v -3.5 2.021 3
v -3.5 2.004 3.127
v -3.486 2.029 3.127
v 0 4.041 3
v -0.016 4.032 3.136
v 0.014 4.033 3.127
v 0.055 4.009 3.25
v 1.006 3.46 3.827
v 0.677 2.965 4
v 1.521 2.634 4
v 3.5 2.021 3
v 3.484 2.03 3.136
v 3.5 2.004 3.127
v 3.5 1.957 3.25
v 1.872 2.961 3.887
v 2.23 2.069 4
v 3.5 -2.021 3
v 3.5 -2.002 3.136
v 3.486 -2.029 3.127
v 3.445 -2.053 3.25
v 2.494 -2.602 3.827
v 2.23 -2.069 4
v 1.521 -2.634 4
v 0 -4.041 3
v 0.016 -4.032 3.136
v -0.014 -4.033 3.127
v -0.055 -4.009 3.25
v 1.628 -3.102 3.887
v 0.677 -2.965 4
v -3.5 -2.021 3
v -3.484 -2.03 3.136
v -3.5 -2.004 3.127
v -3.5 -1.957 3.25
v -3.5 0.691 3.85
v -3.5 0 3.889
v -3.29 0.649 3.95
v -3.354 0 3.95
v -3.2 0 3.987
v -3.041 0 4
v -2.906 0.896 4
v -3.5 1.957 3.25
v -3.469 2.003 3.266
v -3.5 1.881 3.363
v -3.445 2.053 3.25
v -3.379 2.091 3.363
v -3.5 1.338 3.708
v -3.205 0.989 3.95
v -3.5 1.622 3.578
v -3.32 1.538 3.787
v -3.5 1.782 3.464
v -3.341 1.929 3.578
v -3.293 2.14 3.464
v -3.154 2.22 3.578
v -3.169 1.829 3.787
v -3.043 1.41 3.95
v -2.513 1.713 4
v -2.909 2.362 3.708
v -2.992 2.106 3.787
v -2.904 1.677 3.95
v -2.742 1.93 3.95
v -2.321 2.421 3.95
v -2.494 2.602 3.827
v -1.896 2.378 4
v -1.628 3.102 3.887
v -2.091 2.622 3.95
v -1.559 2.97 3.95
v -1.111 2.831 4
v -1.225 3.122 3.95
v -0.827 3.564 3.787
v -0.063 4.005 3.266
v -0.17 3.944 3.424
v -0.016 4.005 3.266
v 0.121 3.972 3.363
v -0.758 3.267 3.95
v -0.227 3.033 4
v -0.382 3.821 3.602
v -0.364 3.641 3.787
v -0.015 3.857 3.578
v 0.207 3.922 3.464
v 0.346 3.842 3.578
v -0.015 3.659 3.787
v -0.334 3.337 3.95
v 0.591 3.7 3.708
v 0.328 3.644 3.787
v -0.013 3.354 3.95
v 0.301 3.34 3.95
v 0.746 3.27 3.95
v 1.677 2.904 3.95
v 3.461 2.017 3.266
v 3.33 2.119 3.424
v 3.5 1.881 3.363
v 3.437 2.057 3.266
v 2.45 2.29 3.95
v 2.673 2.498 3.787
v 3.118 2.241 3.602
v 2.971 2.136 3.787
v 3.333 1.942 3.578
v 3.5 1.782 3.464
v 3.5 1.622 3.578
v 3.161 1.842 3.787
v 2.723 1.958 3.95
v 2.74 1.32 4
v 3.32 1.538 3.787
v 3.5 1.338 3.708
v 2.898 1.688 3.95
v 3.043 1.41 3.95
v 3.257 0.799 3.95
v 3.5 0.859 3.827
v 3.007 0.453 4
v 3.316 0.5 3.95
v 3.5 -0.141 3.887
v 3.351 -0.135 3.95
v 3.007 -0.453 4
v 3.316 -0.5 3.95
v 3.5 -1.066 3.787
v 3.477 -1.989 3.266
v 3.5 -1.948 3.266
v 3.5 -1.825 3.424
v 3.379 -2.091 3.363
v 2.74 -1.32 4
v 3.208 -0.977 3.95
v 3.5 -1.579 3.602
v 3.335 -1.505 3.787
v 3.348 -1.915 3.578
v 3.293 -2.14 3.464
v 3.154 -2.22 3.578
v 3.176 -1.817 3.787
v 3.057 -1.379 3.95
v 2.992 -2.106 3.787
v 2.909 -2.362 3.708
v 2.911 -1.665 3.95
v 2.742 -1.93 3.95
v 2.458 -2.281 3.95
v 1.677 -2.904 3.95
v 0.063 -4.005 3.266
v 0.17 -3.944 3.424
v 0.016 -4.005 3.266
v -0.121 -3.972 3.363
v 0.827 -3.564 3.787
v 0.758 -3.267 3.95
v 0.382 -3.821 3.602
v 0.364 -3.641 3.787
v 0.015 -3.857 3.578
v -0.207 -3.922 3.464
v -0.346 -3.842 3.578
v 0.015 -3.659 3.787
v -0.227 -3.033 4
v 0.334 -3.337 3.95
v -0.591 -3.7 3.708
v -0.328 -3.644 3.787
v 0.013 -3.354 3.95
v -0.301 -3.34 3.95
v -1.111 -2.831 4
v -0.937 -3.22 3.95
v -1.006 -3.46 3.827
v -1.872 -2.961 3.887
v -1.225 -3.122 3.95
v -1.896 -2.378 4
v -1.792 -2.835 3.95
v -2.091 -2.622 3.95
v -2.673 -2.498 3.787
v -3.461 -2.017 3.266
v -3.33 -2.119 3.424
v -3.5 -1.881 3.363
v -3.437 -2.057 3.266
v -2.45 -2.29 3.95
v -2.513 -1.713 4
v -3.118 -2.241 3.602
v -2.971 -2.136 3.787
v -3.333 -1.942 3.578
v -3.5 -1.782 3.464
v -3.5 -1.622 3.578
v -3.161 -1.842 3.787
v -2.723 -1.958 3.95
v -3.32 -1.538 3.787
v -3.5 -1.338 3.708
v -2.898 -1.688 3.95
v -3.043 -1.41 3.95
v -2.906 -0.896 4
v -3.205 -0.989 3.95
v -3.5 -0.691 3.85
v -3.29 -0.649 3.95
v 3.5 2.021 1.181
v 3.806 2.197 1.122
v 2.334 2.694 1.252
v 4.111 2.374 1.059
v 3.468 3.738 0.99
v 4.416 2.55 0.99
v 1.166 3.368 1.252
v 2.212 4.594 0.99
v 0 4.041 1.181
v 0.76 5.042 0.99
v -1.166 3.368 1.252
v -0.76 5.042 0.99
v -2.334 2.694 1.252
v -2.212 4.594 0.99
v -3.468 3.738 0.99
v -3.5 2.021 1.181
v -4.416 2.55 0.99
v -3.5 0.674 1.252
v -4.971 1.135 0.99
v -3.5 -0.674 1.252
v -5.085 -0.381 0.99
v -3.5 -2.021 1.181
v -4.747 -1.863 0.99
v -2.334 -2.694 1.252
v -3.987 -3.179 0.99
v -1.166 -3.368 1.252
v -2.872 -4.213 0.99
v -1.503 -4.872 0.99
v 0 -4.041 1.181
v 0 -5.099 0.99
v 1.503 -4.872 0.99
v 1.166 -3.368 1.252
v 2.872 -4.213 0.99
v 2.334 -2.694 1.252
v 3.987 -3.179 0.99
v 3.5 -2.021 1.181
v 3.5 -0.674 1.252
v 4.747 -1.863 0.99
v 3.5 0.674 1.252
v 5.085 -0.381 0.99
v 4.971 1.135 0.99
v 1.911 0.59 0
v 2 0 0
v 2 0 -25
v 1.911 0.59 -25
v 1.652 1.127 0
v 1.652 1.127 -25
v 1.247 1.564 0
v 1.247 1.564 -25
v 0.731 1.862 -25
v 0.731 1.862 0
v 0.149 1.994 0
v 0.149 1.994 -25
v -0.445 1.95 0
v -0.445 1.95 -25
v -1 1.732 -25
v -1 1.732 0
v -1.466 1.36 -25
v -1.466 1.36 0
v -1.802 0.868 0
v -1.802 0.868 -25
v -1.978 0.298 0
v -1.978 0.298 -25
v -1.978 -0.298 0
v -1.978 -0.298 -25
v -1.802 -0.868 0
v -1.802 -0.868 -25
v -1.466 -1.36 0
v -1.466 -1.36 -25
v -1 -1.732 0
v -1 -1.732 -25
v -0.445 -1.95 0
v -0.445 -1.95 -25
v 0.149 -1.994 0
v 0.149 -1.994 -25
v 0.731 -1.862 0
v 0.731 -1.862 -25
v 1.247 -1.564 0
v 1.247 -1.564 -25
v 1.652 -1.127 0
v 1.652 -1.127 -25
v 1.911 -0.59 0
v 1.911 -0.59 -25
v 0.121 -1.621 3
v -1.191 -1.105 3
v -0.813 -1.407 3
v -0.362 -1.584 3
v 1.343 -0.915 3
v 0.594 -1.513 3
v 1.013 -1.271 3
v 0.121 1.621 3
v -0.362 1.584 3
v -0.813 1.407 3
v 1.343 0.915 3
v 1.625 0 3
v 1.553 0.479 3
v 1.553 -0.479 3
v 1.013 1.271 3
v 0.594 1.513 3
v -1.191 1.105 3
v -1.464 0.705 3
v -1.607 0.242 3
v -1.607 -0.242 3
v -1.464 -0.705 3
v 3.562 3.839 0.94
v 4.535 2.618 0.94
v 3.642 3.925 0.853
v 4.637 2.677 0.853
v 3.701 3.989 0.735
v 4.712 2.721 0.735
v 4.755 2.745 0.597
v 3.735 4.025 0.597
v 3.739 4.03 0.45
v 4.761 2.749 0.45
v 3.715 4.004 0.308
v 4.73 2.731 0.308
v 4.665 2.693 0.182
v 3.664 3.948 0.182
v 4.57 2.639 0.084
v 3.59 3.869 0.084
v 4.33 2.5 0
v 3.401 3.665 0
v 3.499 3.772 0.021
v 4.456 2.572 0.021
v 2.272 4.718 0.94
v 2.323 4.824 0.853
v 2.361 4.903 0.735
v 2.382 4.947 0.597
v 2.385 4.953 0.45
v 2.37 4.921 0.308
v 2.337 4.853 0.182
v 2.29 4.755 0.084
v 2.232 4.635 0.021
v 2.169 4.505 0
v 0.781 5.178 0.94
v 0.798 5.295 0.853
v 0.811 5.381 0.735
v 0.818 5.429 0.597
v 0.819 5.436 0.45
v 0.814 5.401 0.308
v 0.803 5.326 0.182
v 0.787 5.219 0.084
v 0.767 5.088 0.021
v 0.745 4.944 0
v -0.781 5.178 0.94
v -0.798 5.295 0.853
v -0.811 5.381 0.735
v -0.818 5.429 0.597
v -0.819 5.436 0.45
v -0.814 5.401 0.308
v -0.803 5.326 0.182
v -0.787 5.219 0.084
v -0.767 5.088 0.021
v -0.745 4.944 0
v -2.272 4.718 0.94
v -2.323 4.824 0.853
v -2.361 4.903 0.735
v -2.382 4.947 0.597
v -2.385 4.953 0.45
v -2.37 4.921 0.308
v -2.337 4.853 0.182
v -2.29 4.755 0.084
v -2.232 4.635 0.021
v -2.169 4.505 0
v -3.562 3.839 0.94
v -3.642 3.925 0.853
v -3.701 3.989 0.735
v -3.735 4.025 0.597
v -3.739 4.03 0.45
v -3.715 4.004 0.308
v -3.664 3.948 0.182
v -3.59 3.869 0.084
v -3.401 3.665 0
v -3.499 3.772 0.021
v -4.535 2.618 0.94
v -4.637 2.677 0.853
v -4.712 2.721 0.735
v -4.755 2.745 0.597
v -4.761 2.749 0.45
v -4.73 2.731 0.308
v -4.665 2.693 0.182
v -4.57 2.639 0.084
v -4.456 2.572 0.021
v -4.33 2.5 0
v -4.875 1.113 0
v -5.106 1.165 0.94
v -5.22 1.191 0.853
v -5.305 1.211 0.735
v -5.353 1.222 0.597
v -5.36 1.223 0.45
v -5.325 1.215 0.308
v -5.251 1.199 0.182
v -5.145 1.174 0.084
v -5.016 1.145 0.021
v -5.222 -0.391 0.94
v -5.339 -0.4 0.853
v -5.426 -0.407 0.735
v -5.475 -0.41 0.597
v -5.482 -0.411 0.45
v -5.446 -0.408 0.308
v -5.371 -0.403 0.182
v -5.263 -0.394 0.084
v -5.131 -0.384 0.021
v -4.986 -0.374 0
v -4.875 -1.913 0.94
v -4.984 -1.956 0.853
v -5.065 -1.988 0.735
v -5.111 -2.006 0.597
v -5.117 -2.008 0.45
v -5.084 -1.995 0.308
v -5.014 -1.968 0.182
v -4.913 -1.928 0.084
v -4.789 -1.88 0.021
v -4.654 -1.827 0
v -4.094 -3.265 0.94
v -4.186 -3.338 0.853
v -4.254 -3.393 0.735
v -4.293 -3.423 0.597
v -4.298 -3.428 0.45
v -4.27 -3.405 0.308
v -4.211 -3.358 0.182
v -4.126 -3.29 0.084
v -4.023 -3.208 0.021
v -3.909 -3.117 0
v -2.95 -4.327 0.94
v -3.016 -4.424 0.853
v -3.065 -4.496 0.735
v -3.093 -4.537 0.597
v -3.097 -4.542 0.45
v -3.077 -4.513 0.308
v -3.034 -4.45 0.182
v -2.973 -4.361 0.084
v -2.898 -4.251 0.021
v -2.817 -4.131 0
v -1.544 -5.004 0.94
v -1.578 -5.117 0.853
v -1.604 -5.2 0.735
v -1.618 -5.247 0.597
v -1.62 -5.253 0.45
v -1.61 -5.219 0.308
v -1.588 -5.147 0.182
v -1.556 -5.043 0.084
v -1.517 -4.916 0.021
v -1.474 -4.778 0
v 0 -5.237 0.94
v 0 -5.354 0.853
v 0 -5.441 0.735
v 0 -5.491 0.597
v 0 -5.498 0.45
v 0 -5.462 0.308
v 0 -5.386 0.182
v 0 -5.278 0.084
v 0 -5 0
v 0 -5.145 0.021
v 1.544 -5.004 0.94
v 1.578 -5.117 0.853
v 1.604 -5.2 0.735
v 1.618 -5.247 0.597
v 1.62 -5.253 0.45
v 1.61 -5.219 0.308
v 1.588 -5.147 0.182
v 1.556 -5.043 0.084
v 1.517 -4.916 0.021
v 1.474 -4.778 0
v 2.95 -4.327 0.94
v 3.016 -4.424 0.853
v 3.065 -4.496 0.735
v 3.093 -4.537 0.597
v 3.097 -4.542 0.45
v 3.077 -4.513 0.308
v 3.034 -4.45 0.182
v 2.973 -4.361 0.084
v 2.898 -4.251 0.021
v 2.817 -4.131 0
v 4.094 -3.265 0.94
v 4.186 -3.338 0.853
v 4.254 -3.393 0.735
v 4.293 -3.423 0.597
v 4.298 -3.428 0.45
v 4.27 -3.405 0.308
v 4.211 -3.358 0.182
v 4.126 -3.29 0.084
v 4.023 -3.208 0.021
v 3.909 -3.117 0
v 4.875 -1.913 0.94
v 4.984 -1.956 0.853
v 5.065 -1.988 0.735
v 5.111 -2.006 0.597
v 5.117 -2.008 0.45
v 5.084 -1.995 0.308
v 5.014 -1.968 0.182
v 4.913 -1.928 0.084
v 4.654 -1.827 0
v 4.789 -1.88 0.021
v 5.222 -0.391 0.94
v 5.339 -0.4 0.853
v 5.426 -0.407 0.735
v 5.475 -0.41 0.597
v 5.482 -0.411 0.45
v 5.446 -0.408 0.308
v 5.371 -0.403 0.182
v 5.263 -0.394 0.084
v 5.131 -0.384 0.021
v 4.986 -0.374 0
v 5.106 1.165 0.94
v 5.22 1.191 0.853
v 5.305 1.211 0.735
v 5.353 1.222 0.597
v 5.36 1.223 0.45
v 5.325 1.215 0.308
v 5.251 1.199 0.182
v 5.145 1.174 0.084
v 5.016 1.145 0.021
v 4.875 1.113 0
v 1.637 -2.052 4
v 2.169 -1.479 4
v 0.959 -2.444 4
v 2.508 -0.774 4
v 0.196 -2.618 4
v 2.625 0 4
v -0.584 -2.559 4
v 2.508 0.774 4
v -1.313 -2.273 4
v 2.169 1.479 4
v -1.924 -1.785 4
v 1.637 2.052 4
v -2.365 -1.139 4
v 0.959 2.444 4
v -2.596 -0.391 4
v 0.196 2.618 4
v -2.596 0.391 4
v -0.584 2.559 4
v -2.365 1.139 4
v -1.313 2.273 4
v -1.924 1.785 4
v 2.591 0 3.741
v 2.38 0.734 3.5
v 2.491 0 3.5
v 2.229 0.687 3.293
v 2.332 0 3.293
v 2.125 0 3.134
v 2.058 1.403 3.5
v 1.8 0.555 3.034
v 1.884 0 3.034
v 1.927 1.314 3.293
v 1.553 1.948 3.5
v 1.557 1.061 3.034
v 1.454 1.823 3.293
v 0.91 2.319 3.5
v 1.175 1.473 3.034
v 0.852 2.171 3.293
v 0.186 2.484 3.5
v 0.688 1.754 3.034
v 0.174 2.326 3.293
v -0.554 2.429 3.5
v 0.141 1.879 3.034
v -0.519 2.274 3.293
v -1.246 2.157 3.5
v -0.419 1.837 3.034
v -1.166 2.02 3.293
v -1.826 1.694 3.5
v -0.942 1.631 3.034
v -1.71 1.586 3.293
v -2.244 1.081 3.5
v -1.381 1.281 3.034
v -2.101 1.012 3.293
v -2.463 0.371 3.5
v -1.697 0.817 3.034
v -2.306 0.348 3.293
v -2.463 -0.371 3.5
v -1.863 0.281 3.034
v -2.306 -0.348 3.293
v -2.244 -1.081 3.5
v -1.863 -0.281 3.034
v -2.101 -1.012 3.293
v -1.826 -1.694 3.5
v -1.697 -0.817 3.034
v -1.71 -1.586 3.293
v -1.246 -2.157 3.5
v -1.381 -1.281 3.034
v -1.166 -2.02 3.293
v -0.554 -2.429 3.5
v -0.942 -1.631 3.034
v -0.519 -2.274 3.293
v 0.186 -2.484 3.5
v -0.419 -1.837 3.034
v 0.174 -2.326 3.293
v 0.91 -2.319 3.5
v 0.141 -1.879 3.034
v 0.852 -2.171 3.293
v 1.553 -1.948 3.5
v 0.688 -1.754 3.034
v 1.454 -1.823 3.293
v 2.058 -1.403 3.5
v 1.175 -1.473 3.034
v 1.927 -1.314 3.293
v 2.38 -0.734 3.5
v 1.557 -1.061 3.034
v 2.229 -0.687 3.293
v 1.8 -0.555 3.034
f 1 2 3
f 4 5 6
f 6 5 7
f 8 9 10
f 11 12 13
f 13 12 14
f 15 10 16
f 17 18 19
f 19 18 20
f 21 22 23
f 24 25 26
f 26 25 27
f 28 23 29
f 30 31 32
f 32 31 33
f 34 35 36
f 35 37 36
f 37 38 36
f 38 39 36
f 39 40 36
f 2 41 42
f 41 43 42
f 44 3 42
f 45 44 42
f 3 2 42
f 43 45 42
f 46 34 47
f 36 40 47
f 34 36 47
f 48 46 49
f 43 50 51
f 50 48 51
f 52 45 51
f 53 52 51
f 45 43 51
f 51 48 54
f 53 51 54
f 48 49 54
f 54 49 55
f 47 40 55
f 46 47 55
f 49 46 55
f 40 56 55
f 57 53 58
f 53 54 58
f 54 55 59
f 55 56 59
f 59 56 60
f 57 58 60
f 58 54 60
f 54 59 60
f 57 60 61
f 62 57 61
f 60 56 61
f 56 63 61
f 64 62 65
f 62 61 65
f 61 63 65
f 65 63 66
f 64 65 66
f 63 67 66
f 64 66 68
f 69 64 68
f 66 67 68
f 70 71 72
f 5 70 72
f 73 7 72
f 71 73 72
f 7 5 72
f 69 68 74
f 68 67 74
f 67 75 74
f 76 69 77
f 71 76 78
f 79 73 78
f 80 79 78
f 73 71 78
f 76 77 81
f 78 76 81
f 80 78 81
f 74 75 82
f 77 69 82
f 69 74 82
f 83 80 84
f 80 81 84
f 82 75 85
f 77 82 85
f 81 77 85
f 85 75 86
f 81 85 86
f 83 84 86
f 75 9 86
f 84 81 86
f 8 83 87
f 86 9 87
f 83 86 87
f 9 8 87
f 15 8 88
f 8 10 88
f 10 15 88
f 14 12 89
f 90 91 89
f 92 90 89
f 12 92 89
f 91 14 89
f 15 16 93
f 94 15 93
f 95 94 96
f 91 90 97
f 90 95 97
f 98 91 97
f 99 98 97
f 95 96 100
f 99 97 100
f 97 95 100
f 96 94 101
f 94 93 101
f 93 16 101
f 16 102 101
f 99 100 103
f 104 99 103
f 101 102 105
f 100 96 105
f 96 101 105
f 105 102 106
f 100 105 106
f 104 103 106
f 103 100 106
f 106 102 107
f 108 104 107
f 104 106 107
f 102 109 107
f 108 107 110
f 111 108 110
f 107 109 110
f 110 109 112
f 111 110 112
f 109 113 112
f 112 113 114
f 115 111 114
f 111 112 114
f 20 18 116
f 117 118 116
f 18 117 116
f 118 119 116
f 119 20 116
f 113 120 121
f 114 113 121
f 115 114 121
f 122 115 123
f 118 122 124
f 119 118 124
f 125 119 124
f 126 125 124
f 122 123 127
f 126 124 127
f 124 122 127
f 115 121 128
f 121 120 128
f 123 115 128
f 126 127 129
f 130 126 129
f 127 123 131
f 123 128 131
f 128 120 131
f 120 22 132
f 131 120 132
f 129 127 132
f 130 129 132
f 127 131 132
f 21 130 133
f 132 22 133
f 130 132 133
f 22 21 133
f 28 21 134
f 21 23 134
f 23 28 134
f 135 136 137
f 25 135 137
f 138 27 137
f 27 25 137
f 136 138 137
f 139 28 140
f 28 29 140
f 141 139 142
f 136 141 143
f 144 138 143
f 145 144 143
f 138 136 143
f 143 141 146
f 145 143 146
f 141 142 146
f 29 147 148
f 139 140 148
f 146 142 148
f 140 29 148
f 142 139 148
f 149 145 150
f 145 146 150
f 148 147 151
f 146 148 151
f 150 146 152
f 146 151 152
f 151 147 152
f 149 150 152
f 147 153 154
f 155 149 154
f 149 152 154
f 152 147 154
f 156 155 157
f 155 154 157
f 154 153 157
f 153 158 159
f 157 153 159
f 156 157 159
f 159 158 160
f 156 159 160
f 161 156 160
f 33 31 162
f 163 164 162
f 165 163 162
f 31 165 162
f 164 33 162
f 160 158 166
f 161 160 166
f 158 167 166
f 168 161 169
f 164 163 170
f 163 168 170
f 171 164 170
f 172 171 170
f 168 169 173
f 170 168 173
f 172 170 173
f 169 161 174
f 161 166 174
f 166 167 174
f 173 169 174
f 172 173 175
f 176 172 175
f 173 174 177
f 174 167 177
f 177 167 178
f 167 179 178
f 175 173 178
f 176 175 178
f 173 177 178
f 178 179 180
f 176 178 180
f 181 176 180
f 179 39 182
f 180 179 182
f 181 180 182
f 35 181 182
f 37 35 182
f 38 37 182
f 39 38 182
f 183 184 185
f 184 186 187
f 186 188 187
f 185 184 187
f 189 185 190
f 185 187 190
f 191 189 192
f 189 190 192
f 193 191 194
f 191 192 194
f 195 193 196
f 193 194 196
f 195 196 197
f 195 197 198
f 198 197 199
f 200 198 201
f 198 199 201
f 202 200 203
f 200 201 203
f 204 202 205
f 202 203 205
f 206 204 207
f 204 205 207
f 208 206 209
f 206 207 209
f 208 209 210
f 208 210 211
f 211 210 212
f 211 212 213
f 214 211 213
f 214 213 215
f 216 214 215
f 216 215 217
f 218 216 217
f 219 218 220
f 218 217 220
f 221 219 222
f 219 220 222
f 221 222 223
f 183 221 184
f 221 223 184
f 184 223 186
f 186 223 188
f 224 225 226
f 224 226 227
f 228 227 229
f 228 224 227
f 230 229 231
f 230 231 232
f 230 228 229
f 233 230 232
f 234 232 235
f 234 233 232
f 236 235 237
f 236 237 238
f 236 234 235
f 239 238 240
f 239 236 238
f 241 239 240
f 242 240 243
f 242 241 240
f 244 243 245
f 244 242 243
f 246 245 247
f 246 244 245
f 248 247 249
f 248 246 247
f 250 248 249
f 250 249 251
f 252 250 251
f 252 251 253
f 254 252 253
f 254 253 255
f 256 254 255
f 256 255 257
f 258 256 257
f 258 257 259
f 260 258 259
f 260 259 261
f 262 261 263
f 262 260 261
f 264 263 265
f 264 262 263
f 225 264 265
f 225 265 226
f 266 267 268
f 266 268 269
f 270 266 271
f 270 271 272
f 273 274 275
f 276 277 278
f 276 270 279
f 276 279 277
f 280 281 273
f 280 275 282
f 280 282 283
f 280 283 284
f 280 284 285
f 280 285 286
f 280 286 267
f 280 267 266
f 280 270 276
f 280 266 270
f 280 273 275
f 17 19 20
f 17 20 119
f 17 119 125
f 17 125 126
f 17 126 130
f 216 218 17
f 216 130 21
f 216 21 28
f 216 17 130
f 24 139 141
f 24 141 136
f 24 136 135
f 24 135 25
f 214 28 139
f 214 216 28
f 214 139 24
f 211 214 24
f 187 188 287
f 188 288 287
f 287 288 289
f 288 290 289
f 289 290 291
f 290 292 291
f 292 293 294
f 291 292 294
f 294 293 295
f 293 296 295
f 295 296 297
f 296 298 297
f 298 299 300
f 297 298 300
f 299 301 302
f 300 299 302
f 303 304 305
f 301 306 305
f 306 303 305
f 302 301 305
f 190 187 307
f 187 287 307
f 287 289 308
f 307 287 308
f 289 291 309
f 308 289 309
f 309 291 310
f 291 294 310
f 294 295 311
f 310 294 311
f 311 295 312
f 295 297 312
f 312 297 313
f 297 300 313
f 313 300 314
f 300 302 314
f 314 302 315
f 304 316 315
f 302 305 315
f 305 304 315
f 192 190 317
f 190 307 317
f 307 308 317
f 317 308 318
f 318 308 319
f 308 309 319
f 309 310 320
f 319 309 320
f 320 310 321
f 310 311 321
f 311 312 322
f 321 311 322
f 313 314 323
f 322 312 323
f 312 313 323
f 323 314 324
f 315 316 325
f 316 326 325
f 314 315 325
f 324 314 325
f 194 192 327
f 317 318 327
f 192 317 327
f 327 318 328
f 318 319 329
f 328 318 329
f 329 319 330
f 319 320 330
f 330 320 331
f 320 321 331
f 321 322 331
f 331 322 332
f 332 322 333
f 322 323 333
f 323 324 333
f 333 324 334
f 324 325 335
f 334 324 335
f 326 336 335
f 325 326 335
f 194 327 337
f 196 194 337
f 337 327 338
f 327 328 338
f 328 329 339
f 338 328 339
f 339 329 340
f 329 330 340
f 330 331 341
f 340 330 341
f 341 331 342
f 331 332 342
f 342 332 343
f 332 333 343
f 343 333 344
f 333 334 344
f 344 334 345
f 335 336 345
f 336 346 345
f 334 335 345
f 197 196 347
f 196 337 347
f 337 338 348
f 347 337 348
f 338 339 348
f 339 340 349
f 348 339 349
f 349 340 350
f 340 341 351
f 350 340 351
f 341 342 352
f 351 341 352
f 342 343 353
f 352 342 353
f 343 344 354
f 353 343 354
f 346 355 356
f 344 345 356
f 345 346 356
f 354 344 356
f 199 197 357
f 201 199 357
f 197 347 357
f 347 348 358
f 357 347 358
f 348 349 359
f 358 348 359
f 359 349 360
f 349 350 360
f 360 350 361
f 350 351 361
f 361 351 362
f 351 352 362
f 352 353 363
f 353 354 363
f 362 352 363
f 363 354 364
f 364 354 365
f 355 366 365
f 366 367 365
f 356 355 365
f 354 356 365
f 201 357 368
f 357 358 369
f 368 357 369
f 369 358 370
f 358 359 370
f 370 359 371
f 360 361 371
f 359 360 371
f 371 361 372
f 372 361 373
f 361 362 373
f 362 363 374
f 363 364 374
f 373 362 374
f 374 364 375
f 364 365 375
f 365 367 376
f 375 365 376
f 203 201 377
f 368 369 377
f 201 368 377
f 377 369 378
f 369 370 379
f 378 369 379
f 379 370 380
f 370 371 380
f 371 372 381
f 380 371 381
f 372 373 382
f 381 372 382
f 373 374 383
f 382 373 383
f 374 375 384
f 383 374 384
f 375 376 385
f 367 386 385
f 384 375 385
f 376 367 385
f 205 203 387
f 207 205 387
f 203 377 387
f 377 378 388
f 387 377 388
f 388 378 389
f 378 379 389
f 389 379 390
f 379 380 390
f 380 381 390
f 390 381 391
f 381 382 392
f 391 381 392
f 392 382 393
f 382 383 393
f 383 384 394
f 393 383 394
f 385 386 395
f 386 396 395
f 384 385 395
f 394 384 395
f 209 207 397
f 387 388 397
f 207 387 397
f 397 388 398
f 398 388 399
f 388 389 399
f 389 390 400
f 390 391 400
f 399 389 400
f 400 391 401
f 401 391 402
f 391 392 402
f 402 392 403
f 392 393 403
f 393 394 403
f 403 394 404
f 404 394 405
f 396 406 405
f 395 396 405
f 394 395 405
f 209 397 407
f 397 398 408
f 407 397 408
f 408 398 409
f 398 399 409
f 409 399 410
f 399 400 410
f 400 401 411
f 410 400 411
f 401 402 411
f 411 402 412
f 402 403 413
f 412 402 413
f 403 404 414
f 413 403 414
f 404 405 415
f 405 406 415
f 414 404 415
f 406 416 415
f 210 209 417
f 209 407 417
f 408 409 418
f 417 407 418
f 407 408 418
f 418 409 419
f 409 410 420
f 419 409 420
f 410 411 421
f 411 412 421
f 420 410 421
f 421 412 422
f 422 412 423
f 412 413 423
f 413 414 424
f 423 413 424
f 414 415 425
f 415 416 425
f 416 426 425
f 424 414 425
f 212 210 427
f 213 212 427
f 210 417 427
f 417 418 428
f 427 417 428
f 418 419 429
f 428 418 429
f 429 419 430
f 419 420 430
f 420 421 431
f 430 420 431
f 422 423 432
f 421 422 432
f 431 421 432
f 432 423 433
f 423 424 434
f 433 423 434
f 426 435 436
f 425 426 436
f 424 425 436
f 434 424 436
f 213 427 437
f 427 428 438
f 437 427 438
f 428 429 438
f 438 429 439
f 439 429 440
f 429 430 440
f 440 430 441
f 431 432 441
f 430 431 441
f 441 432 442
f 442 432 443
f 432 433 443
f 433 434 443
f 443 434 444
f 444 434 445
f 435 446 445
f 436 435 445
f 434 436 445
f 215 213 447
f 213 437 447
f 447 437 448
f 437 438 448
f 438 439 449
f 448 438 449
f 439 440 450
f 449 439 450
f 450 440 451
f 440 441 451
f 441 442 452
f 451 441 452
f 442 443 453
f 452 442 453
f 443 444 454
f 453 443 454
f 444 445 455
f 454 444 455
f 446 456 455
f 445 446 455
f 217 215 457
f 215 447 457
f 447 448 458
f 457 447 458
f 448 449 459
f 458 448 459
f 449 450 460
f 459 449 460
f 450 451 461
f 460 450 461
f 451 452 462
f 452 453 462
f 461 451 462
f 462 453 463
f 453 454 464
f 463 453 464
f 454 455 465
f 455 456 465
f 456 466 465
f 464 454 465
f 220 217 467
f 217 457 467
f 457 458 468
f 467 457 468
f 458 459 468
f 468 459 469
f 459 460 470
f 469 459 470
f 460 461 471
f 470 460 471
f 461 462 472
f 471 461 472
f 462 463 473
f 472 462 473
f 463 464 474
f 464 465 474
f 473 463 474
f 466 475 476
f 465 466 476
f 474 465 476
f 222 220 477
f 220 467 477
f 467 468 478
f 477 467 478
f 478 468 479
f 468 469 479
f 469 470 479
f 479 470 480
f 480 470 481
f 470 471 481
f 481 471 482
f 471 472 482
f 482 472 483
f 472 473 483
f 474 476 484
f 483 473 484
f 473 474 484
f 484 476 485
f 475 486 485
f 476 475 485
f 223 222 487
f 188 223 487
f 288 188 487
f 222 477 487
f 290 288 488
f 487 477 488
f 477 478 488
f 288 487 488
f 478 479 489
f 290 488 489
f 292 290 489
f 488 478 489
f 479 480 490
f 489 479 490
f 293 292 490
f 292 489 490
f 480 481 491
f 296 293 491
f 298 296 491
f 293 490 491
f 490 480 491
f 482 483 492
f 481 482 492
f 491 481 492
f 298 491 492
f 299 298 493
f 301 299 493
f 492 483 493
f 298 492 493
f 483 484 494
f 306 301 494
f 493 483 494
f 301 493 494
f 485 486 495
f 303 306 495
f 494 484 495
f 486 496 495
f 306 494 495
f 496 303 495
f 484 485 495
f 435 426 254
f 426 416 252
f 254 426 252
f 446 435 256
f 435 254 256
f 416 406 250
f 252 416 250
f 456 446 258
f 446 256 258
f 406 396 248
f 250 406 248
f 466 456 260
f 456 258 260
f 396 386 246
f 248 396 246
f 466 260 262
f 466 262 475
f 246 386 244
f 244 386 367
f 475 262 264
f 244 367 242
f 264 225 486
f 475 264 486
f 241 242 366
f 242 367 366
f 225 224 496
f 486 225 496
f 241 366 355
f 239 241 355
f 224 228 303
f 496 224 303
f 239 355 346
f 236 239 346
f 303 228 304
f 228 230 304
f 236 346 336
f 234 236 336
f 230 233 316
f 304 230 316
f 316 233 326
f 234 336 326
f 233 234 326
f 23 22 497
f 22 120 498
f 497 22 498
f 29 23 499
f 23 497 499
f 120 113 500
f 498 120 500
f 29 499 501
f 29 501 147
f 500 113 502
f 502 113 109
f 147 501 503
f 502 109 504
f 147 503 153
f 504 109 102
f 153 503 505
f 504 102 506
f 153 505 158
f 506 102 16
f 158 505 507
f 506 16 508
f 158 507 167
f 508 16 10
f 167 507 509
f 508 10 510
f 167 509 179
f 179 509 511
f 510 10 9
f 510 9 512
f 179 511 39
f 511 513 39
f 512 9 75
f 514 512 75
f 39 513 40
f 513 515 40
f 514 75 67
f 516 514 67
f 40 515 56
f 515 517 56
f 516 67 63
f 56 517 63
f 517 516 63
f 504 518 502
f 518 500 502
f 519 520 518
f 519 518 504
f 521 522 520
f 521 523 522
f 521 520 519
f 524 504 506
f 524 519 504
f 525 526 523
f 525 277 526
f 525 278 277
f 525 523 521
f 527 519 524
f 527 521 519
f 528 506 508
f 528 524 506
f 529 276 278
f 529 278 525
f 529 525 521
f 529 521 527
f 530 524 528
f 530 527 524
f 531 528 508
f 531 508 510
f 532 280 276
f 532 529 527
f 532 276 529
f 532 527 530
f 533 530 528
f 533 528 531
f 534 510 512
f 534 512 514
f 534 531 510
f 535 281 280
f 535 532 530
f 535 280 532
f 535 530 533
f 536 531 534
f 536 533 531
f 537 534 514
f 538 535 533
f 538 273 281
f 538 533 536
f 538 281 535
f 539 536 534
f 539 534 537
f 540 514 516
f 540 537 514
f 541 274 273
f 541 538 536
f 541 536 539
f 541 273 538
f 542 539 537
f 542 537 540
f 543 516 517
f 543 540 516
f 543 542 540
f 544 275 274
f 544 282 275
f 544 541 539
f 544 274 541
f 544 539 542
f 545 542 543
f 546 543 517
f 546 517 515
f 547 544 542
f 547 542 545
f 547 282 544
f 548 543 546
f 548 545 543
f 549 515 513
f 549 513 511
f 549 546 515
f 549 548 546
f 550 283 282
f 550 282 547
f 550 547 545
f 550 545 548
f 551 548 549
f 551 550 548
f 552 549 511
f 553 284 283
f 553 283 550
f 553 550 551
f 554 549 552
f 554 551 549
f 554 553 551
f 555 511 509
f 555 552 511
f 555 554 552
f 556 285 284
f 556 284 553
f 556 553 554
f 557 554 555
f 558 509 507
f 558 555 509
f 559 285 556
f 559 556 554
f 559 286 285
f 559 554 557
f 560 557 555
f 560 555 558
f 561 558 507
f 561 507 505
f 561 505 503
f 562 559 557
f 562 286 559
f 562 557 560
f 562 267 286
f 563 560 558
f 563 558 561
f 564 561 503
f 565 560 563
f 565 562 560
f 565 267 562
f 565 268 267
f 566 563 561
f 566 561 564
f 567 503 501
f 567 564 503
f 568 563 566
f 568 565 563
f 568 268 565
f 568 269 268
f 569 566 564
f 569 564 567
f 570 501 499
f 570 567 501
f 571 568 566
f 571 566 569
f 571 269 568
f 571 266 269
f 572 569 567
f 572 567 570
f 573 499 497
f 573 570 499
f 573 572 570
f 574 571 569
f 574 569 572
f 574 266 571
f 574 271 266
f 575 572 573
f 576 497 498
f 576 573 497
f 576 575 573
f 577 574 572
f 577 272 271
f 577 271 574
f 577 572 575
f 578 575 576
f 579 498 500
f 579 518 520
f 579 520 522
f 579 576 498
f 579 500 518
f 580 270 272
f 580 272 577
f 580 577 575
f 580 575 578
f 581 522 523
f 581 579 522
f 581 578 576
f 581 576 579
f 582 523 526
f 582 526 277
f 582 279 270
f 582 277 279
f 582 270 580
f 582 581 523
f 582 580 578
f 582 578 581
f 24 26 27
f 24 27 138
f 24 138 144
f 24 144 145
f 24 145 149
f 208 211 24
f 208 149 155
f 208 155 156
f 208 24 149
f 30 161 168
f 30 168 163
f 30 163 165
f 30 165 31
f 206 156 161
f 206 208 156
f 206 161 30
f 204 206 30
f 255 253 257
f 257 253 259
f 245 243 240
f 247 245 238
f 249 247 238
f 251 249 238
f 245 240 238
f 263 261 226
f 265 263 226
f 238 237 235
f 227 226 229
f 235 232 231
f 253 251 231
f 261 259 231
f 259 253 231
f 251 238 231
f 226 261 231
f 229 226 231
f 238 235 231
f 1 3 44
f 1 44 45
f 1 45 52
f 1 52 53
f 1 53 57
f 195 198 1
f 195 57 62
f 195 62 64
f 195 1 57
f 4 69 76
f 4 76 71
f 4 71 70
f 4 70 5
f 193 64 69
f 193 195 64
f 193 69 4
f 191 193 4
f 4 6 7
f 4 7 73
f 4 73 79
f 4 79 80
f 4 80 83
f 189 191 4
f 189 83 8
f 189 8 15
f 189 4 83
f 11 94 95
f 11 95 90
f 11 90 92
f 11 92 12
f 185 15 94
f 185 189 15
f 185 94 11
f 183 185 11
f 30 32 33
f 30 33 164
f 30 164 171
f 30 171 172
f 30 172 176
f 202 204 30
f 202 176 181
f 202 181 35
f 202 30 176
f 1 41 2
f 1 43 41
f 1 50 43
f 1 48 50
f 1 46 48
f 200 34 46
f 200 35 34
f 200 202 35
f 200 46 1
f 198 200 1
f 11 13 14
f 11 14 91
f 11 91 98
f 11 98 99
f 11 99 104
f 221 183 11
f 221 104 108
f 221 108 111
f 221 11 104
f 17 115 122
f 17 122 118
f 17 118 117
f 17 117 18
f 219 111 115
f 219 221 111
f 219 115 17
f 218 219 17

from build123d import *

# Parameters (mm, degrees)
HEAD_DEPTH     = 4
SHANK_SKETCH_R = 2
SHANK_DEPTH    = 25
SKETCH6_R      = 2.625
HEAD_CUT_DEPTH = 1
FILLET1_R      = 1


with BuildPart() as part:
    # Head Sketch → Head (new body)
    with BuildSketch(Plane.XY):
        Polygon((0, 4.041451884), (3.5, 2.020725942), (3.5, -2.020725942), (0, -4.041451884), (-3.5, -2.020725942), (-3.5, 2.020725942), align=None)
    extrude(amount=HEAD_DEPTH)

    # Shank Sketch → Shank (add)
    with BuildSketch(Plane.XY):
        Circle(SHANK_SKETCH_R)
    extrude(amount=-SHANK_DEPTH)

    # Sketch3 → Flange (revolve)
    with BuildSketch(Plane(origin=(0, 0, 0), x_dir=(-1, 0, 0), z_dir=(0, 1, 0)), mode=Mode.PRIVATE) as flange_sk:
        with BuildLine():
            Line((-5, 0), (0, 0))
            Line((0, 0), (0, 1.5))
            ThreePointArc((0, 1.5), (-2.562220765, 1.372207648), (-5.099009901, 0.99009901))
            ThreePointArc((-5.099009901, 0.99009901), (-5.497518595, 0.45024814), (-5, 0))
        make_face()
    revolve(flange_sk.sketch.rotate(Axis((0, 0, 0), (0, 0, 1)), 30), axis=Axis((0, 0, 0), (0, 0, 1)))

    # Sketch5 → Head Trim (revolve, cut)
    with BuildSketch(Plane(origin=(0, 0, 0), x_dir=(0, 0, -1), z_dir=(1, 0, 0)), mode=Mode.PRIVATE) as head_trim_sk:
        with BuildLine():
            Line((-4, -3.041451884), (-4, -4.041451884))
            Line((-4, -4.041451884), (-3, -4.041451884))
            ThreePointArc((-3, -4.041451884), (-3.707106781, -3.748558666), (-4, -3.041451884))
        make_face()
    revolve(head_trim_sk.sketch.rotate(Axis((0, 0, 15.085599173), (0, 0, -1)), 90), axis=Axis((0, 0, 15.085599173), (0, 0, -1)), mode=Mode.SUBTRACT)

    # Sketch6 → Head Cut (cut)
    with BuildSketch(Plane.XY.offset(4)):
        Circle(SKETCH6_R)
    extrude(amount=-HEAD_CUT_DEPTH, mode=Mode.SUBTRACT)

    # Fillet1
    fillet1_edges = [part.edges().sort_by_distance(p)[0] for p in [
        (-2.625, 0, 3),
    ]]
    fillet(fillet1_edges, radius=FILLET1_R - 0.0001)  # a hair under: the kernel refuses the full size


solid = part.part
